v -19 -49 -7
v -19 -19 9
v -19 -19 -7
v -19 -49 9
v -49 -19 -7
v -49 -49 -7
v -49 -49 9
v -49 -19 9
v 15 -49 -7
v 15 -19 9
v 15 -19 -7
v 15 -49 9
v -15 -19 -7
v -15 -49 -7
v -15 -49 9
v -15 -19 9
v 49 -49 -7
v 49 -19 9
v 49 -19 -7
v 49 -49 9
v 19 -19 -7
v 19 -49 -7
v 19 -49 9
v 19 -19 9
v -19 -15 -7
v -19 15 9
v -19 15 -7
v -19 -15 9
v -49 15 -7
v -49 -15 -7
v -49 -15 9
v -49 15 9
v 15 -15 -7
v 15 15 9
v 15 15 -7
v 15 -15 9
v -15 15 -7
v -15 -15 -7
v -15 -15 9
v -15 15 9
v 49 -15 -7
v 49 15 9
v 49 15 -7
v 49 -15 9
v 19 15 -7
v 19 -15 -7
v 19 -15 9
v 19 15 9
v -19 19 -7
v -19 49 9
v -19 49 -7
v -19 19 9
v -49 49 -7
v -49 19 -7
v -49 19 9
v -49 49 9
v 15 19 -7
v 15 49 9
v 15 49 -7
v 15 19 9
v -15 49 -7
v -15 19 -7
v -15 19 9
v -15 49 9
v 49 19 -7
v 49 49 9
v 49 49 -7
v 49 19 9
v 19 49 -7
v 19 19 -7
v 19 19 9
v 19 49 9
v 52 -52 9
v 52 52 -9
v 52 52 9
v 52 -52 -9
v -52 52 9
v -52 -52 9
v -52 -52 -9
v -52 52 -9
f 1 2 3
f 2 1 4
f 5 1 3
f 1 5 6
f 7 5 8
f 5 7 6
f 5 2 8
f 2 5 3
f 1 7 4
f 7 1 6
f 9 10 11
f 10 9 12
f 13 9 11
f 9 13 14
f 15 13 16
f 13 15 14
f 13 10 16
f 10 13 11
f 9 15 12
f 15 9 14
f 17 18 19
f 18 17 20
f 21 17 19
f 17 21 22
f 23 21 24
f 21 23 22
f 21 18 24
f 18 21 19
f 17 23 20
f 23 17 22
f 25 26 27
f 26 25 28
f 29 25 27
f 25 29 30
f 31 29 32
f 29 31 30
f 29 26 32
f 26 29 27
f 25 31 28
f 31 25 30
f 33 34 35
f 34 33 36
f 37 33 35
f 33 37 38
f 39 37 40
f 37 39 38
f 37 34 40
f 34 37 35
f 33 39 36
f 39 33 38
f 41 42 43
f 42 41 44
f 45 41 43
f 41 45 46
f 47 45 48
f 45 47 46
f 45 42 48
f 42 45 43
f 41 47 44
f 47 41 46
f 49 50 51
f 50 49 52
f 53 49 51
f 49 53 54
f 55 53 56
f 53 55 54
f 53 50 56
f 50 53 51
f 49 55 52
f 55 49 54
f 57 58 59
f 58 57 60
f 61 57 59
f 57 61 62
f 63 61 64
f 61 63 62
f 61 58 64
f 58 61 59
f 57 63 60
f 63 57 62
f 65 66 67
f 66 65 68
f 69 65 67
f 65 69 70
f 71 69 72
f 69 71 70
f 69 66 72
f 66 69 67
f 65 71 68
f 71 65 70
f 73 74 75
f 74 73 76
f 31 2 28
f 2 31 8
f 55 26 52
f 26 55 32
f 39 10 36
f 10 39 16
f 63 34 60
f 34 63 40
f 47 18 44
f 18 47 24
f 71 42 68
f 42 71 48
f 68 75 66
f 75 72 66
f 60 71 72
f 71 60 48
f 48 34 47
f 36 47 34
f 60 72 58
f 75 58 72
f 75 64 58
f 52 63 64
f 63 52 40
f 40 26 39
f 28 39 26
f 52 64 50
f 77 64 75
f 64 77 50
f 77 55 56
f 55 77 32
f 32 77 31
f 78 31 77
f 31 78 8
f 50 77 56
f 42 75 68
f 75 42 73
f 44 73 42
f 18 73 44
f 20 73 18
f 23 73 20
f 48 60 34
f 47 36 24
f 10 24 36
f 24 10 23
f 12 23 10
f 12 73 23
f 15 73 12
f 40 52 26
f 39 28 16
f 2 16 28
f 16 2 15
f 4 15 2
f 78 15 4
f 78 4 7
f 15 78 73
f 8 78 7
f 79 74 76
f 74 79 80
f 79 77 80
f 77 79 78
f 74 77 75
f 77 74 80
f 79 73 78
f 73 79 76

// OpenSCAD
$fn = 32;

// ----------------------------------------------------------------------
// Pocket plate 104 x 104 x 18
// 3 x 3 pockets 30 mm square, 16 mm deep
// ----------------------------------------------------------------------

// --- parameters (mm) ---
thickness = 18;  // plate thickness
floor_t = 2;     // material left under each pocket
pocket = 30;     // pocket side length
pitch_x = 34;    // pocket pitch along X
pitch_y = 34;    // pocket pitch along Y
cols = 3;        // pockets per row
rows = 3;        // rows of pockets

// --- derived feature positions (mm) ---
depth = thickness - floor_t;        // = 16   pocket depth, down to the floor
span_x = (cols - 1) * pitch_x;      // = 68   distance between outer pockets
span_y = (rows - 1) * pitch_y;      // = 68   distance between outer pocket rows
origin_x = -span_x / 2;             // = -34   X of the first pocket
origin_y = -span_y / 2;             // = -34   Y of the first pocket
plate = [span_x + pocket + 6, span_y + pocket + 6, thickness];  // = [104, 104, 18]   overall size: pockets plus 3 mm of wall on each side
feature_centers = [
  [origin_x + 0 * pitch_x, origin_y + 0 * pitch_y],
  [origin_x + 1 * pitch_x, origin_y + 0 * pitch_y],
  [origin_x + 2 * pitch_x, origin_y + 0 * pitch_y],
  [origin_x + 0 * pitch_x, origin_y + 1 * pitch_y],
  [origin_x + 1 * pitch_x, origin_y + 1 * pitch_y],
  [origin_x + 2 * pitch_x, origin_y + 1 * pitch_y],
  [origin_x + 0 * pitch_x, origin_y + 2 * pitch_y],
  [origin_x + 1 * pitch_x, origin_y + 2 * pitch_y],
  [origin_x + 2 * pitch_x, origin_y + 2 * pitch_y]
];   // pocket centres, used verbatim by the cutter loop

// plate outline, then one pocket per centre in feature_centers
difference() {
  cube(plate, center = true);
  for (centre = feature_centers)
    translate([centre[0] - pocket / 2, centre[1] - pocket / 2, plate[2] / 2 - depth])
      cube([pocket, pocket, depth + 1]);  // centred on the declared pocket centre
}
